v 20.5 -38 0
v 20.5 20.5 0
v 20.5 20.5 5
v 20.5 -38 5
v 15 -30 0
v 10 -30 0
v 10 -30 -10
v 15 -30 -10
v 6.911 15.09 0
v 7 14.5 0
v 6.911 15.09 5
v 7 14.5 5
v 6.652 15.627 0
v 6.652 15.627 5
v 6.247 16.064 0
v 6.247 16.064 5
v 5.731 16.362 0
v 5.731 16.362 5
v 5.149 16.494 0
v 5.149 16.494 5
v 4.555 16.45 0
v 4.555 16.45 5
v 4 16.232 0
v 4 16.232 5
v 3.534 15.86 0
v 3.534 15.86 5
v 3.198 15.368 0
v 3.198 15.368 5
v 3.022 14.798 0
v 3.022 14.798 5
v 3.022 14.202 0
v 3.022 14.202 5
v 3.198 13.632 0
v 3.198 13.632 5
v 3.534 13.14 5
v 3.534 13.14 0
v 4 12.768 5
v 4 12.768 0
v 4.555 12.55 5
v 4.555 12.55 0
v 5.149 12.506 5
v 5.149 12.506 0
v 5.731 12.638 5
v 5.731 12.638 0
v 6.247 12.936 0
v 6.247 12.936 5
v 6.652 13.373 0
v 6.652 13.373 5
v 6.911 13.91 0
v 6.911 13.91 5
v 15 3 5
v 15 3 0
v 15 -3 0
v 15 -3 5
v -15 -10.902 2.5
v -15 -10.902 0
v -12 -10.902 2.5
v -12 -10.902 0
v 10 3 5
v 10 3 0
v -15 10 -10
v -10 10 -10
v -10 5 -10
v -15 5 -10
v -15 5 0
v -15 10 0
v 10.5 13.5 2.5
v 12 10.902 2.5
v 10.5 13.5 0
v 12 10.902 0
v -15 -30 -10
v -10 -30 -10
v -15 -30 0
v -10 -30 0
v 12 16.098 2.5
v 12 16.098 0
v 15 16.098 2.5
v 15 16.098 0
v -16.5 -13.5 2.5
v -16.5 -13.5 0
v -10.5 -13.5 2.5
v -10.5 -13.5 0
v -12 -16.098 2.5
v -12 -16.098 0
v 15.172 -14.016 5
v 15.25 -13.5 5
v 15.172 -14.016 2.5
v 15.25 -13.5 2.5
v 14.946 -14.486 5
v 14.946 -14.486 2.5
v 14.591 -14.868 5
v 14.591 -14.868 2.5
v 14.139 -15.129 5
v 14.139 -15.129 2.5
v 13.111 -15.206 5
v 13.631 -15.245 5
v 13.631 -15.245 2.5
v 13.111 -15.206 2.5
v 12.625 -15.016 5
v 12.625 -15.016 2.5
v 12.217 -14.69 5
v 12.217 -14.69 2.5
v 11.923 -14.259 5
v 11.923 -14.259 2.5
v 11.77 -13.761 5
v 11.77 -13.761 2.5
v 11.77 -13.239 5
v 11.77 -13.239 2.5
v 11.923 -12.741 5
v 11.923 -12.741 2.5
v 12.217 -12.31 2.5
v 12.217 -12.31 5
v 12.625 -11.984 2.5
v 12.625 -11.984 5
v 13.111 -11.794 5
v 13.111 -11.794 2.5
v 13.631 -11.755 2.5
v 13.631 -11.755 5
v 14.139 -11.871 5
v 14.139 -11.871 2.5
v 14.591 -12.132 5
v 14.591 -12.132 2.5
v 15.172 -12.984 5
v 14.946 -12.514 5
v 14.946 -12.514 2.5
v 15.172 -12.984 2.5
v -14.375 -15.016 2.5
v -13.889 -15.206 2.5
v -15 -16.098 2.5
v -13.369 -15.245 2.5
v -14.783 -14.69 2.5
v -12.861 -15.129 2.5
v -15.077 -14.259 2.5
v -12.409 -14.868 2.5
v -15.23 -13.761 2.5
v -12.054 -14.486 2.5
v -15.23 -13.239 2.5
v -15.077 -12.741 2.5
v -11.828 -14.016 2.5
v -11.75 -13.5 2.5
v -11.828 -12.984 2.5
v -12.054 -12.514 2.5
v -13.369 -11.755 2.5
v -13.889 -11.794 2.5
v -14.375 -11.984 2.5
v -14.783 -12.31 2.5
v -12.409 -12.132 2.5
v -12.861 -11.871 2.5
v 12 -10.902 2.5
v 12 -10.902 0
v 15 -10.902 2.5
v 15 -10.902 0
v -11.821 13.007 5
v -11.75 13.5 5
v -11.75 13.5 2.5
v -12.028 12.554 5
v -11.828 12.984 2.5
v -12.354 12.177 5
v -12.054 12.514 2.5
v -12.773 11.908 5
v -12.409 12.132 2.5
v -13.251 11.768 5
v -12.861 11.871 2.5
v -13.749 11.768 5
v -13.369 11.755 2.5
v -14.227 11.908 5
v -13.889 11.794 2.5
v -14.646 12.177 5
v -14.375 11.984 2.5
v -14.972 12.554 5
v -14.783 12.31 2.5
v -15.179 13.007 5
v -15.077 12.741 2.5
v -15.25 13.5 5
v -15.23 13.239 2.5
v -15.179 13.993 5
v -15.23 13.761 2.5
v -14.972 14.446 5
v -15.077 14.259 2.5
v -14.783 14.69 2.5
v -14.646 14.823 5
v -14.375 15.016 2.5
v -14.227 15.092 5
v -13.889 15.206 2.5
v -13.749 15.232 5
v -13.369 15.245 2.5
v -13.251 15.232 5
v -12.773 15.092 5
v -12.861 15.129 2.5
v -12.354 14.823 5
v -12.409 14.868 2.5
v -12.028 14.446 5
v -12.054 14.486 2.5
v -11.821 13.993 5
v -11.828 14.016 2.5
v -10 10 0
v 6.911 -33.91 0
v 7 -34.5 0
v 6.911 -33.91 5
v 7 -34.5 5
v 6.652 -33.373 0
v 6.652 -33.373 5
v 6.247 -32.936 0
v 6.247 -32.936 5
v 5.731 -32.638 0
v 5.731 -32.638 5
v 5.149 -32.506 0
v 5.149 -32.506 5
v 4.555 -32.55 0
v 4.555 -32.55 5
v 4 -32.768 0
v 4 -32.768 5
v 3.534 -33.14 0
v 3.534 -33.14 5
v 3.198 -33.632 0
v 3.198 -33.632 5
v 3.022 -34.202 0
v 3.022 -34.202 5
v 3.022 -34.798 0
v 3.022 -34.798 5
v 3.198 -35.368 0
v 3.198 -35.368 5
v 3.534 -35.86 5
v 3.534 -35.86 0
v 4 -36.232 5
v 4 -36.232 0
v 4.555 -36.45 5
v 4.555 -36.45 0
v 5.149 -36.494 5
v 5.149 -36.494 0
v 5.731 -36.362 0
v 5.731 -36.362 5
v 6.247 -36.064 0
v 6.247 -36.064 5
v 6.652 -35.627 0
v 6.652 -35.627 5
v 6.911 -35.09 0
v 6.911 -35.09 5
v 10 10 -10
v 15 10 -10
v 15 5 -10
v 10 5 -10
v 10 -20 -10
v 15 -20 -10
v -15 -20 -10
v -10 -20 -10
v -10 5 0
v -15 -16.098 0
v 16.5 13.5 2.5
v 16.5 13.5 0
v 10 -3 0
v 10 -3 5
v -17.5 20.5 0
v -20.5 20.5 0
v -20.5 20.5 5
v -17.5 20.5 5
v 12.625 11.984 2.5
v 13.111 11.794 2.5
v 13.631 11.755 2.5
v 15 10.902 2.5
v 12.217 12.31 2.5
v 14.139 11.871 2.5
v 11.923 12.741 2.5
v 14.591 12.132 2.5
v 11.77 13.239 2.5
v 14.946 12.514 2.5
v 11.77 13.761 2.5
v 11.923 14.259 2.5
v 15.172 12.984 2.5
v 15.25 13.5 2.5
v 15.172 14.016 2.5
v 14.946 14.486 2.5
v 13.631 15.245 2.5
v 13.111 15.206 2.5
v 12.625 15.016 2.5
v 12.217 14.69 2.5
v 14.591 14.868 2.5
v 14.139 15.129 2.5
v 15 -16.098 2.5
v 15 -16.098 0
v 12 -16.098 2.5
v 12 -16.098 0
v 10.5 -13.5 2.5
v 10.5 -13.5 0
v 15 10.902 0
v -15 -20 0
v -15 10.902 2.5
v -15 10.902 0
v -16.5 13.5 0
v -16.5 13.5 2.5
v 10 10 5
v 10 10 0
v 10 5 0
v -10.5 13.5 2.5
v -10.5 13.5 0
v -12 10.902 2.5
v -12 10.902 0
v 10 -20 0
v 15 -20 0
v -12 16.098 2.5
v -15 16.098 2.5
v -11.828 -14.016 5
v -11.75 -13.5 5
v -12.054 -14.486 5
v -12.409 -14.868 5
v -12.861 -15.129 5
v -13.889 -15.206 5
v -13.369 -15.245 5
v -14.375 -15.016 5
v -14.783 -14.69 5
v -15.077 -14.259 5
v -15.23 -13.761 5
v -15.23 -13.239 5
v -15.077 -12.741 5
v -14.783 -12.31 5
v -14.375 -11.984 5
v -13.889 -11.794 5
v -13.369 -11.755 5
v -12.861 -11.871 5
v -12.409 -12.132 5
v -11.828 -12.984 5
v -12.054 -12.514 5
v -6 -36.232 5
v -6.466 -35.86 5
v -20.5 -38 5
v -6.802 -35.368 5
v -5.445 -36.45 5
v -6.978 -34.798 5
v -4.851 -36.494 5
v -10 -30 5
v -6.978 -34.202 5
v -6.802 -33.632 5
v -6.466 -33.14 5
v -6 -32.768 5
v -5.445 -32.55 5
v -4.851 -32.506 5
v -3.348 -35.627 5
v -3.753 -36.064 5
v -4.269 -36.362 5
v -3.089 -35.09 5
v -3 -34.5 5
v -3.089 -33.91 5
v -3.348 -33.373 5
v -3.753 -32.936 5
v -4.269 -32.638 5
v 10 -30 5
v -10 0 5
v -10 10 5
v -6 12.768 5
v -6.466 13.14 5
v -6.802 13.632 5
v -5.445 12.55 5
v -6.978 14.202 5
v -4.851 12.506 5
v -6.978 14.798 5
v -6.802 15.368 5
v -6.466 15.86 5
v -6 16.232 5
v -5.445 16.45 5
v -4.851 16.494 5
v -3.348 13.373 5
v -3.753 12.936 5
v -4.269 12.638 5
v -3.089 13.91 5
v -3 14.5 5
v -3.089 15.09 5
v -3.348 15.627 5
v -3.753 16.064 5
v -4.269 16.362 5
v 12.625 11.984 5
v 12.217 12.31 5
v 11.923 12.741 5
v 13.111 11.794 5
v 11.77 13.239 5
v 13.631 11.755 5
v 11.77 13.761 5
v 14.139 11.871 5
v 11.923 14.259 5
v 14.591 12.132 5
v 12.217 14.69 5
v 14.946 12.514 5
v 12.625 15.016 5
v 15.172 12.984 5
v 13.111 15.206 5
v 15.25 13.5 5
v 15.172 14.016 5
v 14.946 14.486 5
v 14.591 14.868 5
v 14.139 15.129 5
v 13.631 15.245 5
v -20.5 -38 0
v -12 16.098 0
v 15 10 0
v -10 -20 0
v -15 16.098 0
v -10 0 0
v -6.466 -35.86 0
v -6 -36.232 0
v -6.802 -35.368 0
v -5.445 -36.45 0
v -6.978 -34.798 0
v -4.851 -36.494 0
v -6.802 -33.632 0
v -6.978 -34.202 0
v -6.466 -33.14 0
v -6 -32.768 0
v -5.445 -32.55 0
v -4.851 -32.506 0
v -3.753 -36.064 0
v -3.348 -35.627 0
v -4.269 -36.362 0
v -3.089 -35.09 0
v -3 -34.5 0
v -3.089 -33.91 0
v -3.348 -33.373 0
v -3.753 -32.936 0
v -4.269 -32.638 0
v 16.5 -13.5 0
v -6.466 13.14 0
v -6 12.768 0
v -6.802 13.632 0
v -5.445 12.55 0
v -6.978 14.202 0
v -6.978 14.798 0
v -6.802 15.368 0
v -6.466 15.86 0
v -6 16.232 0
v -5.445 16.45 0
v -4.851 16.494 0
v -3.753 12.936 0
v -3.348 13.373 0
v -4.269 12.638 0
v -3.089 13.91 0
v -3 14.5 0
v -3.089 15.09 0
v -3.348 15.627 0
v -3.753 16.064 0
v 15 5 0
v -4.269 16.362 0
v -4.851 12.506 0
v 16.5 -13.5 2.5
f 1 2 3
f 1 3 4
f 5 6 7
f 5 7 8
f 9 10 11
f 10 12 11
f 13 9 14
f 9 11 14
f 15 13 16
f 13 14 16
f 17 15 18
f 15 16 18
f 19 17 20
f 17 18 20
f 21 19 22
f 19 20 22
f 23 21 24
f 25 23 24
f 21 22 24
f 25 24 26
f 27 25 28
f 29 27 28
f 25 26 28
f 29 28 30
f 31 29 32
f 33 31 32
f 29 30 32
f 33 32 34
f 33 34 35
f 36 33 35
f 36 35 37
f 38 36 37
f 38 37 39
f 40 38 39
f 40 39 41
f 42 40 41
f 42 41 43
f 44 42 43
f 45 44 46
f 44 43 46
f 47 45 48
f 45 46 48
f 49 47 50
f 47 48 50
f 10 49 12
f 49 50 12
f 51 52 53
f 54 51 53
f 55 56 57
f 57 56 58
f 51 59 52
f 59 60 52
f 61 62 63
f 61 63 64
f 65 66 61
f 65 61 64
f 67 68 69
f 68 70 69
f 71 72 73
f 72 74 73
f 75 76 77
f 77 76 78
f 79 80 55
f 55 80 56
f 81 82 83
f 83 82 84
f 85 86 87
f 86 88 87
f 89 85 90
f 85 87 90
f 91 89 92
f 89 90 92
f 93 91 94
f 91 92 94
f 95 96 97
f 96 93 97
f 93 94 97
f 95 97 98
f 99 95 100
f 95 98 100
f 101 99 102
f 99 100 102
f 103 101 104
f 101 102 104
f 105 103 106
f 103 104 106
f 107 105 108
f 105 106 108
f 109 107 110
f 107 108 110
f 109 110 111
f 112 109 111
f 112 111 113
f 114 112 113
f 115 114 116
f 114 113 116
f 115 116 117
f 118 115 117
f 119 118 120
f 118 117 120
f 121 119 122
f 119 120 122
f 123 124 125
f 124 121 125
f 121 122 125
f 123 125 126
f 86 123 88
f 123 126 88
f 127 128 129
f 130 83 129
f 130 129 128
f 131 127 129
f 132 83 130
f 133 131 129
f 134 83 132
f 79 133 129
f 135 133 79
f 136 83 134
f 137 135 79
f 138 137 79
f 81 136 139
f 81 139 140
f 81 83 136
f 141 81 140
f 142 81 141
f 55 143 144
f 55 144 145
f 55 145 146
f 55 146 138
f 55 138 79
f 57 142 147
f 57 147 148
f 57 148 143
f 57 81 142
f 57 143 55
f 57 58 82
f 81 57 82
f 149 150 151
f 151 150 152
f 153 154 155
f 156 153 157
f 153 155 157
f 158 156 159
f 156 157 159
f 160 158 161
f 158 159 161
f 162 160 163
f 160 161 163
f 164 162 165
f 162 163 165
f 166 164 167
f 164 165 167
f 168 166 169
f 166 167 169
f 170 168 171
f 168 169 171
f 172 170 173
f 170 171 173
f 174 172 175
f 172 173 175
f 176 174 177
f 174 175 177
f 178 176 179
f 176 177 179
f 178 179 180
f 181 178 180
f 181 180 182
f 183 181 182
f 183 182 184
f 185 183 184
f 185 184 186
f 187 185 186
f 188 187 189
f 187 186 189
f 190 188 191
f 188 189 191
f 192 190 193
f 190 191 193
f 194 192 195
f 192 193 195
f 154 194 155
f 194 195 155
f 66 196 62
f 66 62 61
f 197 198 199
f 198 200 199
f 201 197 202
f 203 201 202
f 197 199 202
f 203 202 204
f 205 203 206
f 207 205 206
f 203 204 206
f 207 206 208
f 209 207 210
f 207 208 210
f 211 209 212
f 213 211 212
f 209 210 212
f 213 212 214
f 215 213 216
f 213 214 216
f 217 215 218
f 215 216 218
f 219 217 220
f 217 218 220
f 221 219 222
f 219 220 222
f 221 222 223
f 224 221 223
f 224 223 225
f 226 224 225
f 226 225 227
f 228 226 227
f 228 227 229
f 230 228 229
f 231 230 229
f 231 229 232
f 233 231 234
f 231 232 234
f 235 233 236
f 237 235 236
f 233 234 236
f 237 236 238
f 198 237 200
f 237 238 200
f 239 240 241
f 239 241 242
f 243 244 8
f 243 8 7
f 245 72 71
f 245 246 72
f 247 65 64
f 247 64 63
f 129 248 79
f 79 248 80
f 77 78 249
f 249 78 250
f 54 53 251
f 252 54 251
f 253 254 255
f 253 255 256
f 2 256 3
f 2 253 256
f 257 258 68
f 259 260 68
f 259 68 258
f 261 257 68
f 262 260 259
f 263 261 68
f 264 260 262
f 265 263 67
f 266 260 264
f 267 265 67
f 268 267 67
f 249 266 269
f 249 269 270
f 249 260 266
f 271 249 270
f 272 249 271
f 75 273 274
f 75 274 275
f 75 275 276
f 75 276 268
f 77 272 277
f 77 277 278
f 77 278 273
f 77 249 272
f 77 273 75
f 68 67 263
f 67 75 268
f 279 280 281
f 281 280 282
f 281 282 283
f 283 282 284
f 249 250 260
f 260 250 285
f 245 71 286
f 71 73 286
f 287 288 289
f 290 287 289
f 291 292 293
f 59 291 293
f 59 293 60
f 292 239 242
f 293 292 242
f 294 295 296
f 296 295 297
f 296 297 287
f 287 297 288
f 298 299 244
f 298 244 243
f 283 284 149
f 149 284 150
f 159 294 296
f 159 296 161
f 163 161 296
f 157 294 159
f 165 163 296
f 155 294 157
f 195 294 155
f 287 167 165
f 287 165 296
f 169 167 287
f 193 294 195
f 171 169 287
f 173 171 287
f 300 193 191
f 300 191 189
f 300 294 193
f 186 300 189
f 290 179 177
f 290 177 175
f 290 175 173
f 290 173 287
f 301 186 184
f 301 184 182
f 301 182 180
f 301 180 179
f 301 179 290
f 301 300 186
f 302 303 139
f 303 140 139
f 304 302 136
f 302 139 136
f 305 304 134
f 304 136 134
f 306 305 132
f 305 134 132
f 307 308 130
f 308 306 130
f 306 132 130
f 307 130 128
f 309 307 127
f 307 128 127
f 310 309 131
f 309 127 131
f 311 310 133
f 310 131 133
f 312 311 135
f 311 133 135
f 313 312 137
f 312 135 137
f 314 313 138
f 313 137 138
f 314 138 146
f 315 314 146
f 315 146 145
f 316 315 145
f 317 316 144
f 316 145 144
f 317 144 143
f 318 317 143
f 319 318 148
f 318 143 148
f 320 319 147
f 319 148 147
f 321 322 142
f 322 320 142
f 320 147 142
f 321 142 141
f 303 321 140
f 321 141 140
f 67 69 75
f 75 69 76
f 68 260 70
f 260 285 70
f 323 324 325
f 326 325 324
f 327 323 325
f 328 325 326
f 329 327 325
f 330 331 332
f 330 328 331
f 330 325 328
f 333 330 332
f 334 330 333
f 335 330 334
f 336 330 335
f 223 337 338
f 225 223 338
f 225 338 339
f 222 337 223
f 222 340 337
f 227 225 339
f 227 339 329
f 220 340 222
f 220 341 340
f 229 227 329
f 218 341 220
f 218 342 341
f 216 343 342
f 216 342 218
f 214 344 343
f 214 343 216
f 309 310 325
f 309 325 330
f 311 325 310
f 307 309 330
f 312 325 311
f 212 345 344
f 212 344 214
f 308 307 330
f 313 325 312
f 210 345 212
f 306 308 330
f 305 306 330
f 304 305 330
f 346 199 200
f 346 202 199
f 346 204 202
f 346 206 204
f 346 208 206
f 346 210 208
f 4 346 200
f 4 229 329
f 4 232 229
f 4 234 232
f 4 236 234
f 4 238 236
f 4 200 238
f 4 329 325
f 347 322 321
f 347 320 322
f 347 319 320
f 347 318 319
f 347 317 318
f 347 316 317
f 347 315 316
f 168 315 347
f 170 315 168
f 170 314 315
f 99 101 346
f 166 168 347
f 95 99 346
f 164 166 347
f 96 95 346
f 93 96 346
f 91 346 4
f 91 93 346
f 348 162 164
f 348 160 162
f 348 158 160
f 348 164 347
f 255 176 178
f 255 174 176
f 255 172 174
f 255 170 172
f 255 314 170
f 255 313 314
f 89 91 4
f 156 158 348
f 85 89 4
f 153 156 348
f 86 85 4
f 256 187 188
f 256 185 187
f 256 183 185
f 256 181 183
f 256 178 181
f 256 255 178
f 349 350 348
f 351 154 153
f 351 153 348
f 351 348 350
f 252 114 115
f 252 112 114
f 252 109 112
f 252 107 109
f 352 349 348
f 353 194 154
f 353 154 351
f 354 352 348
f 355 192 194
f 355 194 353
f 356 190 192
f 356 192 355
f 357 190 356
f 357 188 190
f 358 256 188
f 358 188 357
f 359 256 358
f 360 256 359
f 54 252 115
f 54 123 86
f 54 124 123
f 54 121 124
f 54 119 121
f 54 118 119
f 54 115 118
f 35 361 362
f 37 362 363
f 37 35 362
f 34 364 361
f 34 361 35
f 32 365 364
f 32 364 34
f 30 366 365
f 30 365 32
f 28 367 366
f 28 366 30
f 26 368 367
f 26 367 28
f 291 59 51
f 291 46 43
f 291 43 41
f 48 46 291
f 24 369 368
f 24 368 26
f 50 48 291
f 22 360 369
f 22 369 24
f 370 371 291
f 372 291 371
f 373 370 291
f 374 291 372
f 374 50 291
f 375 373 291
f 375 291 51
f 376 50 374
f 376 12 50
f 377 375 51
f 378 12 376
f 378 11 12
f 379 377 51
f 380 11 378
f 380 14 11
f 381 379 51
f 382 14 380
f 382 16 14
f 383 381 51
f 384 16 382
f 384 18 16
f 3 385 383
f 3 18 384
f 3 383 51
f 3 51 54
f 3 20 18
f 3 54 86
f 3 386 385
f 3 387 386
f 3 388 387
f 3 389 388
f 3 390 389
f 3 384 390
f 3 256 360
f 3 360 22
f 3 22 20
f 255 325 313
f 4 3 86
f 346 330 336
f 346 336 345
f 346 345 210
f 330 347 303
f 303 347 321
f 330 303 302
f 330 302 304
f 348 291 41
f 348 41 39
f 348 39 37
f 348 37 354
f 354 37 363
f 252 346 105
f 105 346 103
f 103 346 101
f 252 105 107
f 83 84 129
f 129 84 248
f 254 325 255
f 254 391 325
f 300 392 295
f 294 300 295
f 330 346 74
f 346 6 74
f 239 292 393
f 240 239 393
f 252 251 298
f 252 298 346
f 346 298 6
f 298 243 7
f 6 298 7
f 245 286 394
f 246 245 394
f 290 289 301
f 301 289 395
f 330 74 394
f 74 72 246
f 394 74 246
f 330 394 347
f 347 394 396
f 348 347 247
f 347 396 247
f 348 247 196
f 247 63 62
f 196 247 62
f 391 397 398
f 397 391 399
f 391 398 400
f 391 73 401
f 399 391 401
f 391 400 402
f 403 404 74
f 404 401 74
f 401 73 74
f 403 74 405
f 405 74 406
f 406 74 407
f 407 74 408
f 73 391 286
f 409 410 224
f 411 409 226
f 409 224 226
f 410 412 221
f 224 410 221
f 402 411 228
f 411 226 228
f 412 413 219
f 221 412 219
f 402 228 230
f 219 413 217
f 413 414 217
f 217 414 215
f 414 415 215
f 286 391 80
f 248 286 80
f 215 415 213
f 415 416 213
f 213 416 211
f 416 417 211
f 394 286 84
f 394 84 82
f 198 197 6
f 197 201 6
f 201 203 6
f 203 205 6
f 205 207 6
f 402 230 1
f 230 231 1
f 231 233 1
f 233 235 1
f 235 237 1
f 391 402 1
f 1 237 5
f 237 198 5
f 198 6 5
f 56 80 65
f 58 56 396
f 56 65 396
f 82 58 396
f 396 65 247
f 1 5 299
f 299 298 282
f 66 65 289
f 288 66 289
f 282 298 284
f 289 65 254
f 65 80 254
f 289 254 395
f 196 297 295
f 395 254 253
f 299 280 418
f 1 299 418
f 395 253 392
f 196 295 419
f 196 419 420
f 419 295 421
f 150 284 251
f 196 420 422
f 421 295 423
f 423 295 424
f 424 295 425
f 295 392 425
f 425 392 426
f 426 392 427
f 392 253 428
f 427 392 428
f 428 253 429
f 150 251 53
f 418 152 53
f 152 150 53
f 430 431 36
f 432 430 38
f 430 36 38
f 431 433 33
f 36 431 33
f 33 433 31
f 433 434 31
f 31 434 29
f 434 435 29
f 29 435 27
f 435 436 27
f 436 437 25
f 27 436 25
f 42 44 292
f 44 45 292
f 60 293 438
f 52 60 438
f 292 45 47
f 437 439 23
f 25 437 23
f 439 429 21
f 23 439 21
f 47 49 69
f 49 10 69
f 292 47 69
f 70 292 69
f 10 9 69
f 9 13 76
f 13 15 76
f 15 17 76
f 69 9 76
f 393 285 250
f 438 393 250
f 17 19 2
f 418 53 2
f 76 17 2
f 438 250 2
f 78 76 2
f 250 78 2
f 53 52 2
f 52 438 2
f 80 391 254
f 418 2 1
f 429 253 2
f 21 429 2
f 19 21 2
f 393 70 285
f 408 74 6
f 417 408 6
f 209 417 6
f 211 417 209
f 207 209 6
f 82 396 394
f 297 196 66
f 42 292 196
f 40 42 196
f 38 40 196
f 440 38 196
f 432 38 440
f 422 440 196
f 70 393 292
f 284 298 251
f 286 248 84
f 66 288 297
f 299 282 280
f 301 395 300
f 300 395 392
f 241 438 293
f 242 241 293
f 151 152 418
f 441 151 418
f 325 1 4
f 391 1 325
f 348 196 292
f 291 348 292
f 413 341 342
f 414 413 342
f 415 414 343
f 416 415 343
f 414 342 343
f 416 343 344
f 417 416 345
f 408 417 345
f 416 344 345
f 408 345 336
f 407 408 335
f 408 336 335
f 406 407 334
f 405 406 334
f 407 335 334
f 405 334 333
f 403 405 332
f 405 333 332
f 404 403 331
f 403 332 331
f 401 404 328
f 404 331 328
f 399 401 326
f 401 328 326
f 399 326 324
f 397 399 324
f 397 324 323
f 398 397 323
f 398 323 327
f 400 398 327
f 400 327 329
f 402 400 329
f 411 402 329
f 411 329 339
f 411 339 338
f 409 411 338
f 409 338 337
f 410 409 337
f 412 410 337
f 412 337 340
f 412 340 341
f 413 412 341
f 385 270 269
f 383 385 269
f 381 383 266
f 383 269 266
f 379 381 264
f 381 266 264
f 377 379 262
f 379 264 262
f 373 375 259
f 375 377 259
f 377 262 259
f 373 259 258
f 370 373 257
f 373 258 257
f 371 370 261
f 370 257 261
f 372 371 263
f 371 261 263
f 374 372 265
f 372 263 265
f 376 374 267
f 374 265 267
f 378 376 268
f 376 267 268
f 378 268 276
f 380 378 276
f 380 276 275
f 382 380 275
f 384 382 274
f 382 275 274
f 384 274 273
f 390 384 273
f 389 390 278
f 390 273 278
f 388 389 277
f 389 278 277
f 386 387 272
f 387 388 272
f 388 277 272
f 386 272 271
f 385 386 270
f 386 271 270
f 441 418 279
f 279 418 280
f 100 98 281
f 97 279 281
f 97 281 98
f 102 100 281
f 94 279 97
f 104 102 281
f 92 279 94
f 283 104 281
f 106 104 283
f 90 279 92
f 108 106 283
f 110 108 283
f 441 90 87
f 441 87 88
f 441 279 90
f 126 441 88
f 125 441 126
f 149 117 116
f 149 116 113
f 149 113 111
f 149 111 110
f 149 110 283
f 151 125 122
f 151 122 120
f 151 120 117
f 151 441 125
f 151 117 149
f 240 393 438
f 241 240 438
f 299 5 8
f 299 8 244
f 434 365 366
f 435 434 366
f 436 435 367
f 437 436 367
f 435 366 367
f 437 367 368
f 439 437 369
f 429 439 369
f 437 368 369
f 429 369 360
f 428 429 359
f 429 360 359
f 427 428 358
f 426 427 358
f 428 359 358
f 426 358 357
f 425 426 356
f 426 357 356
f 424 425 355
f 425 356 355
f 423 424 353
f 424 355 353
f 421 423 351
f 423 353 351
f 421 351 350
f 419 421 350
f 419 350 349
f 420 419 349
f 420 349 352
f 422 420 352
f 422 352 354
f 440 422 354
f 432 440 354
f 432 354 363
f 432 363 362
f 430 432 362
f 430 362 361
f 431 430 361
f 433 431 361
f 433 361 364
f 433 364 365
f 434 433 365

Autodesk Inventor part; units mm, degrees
ref_plane "YZ Plane" through (0, 0, 0) normal (1, 0, 0) x (0, 1, 0)
ref_plane "XZ Plane" through (0, 0, 0) normal (0, 1, 0) x (-1, 0, 0)
ref_plane "XY Plane" through (0, 0, 0) normal (0, 0, 1) x (1, 0, 0)
sketch "Sketch1" plane through (0, 0, 0) normal (0, 0, 1) x (1, 0, 0)
  line L0 (0, 0) -> (-17.5, 0)
  line L1 (-17.5, 0) -> (-17.5, 17.5)
  line L2 (-17.5, 17.5) -> (17.5, 17.5)
  line L3 (-17.5, 17.5) -> (-17.5, 13.5)
  line L4 (-17.5, 13.5) -> (-13.5, 13.5)
  circle A0 centre (-13.5, 13.5) radius 1.75
  circle A1 centre (-13.5, -13.5) radius 1.75
  circle A2 centre (13.5, -13.5) radius 1.75
  circle A3 centre (13.5, 13.5) radius 1.75
  line L5 (0, 0) -> (-10, 0)
  line L6 (-10, 0) -> (-10, 10)
  line L7 (-10, 10) -> (10, 10)
  line L8 (10, 10) -> (10, -30)
  line L9 (10, -30) -> (-10, -30)
  line L10 (-10, -30) -> (-10, 0)
  line L11 (-17.5, 0) -> (-17.5, -35)
  line L12 (-17.5, -35) -> (17.5, -35)
  line L13 (17.5, -35) -> (17.5, 17.5)
  line L14 (10, 10) -> (10, 3)
  line L15 (10, 3) -> (15, 3)
  line L16 (15, 3) -> (15, -3)
  line L17 (15, -3) -> (10, -3)
  line L18 (-17.5, 17.5) -> (-17.5, 20.5)
  line L19 (-17.5, 20.5) -> (20.5, 20.5)
  line L20 (20.5, 20.5) -> (20.5, -38)
  line L21 (20.5, -38) -> (-20.5, -38)
  line L22 (-20.5, -38) -> (-20.5, 20.5)
  line L23 (-20.5, 20.5) -> (-17.5, 20.5)
  dimension "d0" = 17.5
  dimension "d1" = 17.5
  dimension "d2" = 35
  dimension "d3" = 4
  dimension "d4" = 4
  dimension "d5" = 3.5
  dimension "d8" = 360
  dimension "d10" = 10
  dimension "d11" = 10
  dimension "d12" = 20
  dimension "d13" = 40
  dimension "d14" = 20
  dimension "d15" = 35
  dimension "d16" = 7
  dimension "d17" = 5
  dimension "d18" = 6
  dimension "d19" = 3
  dimension "d20" = 38
  dimension "d21" = 58.5
  dimension "d22" = 41
extrude "Extrusion1" add sketch "Sketch1" along normal blind 5 contours L1 L2 L13 L12 L11 | L19 L20 L21 L22 L23
sketch "Sketch2" plane through (0, 0, 0) normal (0, 0, -1) x (-1, 0, 0)
  circle A0 centre (-13.5, 13.5) radius 1.75 projected
  line L0 (-13.5, 13.5) -> (-10.5, 13.5)
  line L1 (-10.5, 13.5) -> (-12, 16.0981)
  line L2 (-12, 16.0981) -> (-13.5, 13.5)
  point P0 (0, 0)
  dimension "d25" = 3
  dimension "d26" = 3
  dimension "d27" = 60
extrude "Extrusion2" cut sketch "Sketch2" against normal blind 2.5 contours L0 L2 A0 | A0 L2 L1 L0 picked at (-12.4952, 14.0801)
pattern_circular "Circular Pattern1" count 6 over 360 about axis through (13.5, 13.5, 0) along (0, 0, 1) of "Extrusion2"
sketch "Sketch3" plane through (0, 0, 0) normal (0, 0, -1) x (-1, 0, 0)
  line L0 (0, 0) -> (5, 0)
  line L1 (0, 0) -> (0, 5)
  dimension "d33" = 5
  dimension "d34" = 5
pattern_linear "Rectangular Pattern1" count 2 spacing 27 along (-1, 0, 0) count 2 spacing 27 along (0, -1, 0) of "Extrusion2", "Circular Pattern1"
sketch "Sketch4" plane through (0, 0, 5) normal (0, 0, 1) x (1, 0, 0)
  line L0 (-10, 10) -> (10, 10) projected
  line L1 (0, 10) -> (0, 14.5)
  line L2 (0, 14.5) -> (3, 14.5)
  line L3 (3, 14.5) -> (-3, 14.5)
  line L4 (3, 14.5) -> (5, 14.5)
  line L5 (-3, 14.5) -> (-5, 14.5)
  circle A0 centre (-5, 14.5) radius 2
  circle A1 centre (5, 14.5) radius 2
  line L6 (10, 10) -> (10, -30)
  line L7 (-10, -30) -> (10, -30) projected
  line L8 (10, 10) -> (10, -10)
  line L9 (10, -30) -> (10, -3) projected
  line L10 (10, -10) -> (0.7941, -10)
  circle A2 centre (-5, -34.5) radius 2
  circle A3 centre (5, -34.5) radius 2
  point P0 (0, 0)
  dimension "d41" = 4.5
  dimension "d42" = 3
  dimension "d43" = 6
  dimension "d44" = 2
  dimension "d45" = 2
  dimension "d46" = 4
  dimension "d47" = 4
  dimension "d48" = 20
extrude "Extrusion3" cut sketch "Sketch4" against normal through all
sketch "Sketch5" plane through (0, 0, 0) normal (0, 0, -1) x (-1, 0, 0)
  line L0 (10, -30) -> (15, -30)
  line L1 (15, -30) -> (15, -20)
  line L2 (15, -20) -> (10, -20)
  line L3 (10, 10) -> (10, -30) projected
  line L4 (-10, -30) -> (-15, -30)
  line L5 (-15, -30) -> (-15, -20)
  line L6 (-15, -20) -> (-10, -20)
  line L7 (-10, -30) -> (-10, -3) projected
  line L8 (-10, -30) -> (-10, -20)
  line L9 (10, -20) -> (10, -30)
  line L10 (-10, 10) -> (-15, 10)
  line L11 (-15, 10) -> (-15, 5)
  line L12 (-15, 5) -> (-10, 5)
  line L13 (-10, 3) -> (-10, 10) projected
  line L14 (-10, 10) -> (-10, 5)
  line L15 (10, 10) -> (15, 10)
  line L16 (15, 10) -> (15, 5)
  line L17 (15, 5) -> (10, 5)
  line L18 (10, 10) -> (10, 5)
  point P0 (0, 0)
  dimension "d51" = 5
  dimension "d52" = 10
  dimension "d53" = 5
  dimension "d54" = 10
  dimension "d55" = 5
  dimension "d56" = 5
  dimension "d57" = 5
  dimension "d58" = 5
extrude "Extrusion4" add sketch "Sketch5" along normal blind 10
properties part number "servorPlace"
